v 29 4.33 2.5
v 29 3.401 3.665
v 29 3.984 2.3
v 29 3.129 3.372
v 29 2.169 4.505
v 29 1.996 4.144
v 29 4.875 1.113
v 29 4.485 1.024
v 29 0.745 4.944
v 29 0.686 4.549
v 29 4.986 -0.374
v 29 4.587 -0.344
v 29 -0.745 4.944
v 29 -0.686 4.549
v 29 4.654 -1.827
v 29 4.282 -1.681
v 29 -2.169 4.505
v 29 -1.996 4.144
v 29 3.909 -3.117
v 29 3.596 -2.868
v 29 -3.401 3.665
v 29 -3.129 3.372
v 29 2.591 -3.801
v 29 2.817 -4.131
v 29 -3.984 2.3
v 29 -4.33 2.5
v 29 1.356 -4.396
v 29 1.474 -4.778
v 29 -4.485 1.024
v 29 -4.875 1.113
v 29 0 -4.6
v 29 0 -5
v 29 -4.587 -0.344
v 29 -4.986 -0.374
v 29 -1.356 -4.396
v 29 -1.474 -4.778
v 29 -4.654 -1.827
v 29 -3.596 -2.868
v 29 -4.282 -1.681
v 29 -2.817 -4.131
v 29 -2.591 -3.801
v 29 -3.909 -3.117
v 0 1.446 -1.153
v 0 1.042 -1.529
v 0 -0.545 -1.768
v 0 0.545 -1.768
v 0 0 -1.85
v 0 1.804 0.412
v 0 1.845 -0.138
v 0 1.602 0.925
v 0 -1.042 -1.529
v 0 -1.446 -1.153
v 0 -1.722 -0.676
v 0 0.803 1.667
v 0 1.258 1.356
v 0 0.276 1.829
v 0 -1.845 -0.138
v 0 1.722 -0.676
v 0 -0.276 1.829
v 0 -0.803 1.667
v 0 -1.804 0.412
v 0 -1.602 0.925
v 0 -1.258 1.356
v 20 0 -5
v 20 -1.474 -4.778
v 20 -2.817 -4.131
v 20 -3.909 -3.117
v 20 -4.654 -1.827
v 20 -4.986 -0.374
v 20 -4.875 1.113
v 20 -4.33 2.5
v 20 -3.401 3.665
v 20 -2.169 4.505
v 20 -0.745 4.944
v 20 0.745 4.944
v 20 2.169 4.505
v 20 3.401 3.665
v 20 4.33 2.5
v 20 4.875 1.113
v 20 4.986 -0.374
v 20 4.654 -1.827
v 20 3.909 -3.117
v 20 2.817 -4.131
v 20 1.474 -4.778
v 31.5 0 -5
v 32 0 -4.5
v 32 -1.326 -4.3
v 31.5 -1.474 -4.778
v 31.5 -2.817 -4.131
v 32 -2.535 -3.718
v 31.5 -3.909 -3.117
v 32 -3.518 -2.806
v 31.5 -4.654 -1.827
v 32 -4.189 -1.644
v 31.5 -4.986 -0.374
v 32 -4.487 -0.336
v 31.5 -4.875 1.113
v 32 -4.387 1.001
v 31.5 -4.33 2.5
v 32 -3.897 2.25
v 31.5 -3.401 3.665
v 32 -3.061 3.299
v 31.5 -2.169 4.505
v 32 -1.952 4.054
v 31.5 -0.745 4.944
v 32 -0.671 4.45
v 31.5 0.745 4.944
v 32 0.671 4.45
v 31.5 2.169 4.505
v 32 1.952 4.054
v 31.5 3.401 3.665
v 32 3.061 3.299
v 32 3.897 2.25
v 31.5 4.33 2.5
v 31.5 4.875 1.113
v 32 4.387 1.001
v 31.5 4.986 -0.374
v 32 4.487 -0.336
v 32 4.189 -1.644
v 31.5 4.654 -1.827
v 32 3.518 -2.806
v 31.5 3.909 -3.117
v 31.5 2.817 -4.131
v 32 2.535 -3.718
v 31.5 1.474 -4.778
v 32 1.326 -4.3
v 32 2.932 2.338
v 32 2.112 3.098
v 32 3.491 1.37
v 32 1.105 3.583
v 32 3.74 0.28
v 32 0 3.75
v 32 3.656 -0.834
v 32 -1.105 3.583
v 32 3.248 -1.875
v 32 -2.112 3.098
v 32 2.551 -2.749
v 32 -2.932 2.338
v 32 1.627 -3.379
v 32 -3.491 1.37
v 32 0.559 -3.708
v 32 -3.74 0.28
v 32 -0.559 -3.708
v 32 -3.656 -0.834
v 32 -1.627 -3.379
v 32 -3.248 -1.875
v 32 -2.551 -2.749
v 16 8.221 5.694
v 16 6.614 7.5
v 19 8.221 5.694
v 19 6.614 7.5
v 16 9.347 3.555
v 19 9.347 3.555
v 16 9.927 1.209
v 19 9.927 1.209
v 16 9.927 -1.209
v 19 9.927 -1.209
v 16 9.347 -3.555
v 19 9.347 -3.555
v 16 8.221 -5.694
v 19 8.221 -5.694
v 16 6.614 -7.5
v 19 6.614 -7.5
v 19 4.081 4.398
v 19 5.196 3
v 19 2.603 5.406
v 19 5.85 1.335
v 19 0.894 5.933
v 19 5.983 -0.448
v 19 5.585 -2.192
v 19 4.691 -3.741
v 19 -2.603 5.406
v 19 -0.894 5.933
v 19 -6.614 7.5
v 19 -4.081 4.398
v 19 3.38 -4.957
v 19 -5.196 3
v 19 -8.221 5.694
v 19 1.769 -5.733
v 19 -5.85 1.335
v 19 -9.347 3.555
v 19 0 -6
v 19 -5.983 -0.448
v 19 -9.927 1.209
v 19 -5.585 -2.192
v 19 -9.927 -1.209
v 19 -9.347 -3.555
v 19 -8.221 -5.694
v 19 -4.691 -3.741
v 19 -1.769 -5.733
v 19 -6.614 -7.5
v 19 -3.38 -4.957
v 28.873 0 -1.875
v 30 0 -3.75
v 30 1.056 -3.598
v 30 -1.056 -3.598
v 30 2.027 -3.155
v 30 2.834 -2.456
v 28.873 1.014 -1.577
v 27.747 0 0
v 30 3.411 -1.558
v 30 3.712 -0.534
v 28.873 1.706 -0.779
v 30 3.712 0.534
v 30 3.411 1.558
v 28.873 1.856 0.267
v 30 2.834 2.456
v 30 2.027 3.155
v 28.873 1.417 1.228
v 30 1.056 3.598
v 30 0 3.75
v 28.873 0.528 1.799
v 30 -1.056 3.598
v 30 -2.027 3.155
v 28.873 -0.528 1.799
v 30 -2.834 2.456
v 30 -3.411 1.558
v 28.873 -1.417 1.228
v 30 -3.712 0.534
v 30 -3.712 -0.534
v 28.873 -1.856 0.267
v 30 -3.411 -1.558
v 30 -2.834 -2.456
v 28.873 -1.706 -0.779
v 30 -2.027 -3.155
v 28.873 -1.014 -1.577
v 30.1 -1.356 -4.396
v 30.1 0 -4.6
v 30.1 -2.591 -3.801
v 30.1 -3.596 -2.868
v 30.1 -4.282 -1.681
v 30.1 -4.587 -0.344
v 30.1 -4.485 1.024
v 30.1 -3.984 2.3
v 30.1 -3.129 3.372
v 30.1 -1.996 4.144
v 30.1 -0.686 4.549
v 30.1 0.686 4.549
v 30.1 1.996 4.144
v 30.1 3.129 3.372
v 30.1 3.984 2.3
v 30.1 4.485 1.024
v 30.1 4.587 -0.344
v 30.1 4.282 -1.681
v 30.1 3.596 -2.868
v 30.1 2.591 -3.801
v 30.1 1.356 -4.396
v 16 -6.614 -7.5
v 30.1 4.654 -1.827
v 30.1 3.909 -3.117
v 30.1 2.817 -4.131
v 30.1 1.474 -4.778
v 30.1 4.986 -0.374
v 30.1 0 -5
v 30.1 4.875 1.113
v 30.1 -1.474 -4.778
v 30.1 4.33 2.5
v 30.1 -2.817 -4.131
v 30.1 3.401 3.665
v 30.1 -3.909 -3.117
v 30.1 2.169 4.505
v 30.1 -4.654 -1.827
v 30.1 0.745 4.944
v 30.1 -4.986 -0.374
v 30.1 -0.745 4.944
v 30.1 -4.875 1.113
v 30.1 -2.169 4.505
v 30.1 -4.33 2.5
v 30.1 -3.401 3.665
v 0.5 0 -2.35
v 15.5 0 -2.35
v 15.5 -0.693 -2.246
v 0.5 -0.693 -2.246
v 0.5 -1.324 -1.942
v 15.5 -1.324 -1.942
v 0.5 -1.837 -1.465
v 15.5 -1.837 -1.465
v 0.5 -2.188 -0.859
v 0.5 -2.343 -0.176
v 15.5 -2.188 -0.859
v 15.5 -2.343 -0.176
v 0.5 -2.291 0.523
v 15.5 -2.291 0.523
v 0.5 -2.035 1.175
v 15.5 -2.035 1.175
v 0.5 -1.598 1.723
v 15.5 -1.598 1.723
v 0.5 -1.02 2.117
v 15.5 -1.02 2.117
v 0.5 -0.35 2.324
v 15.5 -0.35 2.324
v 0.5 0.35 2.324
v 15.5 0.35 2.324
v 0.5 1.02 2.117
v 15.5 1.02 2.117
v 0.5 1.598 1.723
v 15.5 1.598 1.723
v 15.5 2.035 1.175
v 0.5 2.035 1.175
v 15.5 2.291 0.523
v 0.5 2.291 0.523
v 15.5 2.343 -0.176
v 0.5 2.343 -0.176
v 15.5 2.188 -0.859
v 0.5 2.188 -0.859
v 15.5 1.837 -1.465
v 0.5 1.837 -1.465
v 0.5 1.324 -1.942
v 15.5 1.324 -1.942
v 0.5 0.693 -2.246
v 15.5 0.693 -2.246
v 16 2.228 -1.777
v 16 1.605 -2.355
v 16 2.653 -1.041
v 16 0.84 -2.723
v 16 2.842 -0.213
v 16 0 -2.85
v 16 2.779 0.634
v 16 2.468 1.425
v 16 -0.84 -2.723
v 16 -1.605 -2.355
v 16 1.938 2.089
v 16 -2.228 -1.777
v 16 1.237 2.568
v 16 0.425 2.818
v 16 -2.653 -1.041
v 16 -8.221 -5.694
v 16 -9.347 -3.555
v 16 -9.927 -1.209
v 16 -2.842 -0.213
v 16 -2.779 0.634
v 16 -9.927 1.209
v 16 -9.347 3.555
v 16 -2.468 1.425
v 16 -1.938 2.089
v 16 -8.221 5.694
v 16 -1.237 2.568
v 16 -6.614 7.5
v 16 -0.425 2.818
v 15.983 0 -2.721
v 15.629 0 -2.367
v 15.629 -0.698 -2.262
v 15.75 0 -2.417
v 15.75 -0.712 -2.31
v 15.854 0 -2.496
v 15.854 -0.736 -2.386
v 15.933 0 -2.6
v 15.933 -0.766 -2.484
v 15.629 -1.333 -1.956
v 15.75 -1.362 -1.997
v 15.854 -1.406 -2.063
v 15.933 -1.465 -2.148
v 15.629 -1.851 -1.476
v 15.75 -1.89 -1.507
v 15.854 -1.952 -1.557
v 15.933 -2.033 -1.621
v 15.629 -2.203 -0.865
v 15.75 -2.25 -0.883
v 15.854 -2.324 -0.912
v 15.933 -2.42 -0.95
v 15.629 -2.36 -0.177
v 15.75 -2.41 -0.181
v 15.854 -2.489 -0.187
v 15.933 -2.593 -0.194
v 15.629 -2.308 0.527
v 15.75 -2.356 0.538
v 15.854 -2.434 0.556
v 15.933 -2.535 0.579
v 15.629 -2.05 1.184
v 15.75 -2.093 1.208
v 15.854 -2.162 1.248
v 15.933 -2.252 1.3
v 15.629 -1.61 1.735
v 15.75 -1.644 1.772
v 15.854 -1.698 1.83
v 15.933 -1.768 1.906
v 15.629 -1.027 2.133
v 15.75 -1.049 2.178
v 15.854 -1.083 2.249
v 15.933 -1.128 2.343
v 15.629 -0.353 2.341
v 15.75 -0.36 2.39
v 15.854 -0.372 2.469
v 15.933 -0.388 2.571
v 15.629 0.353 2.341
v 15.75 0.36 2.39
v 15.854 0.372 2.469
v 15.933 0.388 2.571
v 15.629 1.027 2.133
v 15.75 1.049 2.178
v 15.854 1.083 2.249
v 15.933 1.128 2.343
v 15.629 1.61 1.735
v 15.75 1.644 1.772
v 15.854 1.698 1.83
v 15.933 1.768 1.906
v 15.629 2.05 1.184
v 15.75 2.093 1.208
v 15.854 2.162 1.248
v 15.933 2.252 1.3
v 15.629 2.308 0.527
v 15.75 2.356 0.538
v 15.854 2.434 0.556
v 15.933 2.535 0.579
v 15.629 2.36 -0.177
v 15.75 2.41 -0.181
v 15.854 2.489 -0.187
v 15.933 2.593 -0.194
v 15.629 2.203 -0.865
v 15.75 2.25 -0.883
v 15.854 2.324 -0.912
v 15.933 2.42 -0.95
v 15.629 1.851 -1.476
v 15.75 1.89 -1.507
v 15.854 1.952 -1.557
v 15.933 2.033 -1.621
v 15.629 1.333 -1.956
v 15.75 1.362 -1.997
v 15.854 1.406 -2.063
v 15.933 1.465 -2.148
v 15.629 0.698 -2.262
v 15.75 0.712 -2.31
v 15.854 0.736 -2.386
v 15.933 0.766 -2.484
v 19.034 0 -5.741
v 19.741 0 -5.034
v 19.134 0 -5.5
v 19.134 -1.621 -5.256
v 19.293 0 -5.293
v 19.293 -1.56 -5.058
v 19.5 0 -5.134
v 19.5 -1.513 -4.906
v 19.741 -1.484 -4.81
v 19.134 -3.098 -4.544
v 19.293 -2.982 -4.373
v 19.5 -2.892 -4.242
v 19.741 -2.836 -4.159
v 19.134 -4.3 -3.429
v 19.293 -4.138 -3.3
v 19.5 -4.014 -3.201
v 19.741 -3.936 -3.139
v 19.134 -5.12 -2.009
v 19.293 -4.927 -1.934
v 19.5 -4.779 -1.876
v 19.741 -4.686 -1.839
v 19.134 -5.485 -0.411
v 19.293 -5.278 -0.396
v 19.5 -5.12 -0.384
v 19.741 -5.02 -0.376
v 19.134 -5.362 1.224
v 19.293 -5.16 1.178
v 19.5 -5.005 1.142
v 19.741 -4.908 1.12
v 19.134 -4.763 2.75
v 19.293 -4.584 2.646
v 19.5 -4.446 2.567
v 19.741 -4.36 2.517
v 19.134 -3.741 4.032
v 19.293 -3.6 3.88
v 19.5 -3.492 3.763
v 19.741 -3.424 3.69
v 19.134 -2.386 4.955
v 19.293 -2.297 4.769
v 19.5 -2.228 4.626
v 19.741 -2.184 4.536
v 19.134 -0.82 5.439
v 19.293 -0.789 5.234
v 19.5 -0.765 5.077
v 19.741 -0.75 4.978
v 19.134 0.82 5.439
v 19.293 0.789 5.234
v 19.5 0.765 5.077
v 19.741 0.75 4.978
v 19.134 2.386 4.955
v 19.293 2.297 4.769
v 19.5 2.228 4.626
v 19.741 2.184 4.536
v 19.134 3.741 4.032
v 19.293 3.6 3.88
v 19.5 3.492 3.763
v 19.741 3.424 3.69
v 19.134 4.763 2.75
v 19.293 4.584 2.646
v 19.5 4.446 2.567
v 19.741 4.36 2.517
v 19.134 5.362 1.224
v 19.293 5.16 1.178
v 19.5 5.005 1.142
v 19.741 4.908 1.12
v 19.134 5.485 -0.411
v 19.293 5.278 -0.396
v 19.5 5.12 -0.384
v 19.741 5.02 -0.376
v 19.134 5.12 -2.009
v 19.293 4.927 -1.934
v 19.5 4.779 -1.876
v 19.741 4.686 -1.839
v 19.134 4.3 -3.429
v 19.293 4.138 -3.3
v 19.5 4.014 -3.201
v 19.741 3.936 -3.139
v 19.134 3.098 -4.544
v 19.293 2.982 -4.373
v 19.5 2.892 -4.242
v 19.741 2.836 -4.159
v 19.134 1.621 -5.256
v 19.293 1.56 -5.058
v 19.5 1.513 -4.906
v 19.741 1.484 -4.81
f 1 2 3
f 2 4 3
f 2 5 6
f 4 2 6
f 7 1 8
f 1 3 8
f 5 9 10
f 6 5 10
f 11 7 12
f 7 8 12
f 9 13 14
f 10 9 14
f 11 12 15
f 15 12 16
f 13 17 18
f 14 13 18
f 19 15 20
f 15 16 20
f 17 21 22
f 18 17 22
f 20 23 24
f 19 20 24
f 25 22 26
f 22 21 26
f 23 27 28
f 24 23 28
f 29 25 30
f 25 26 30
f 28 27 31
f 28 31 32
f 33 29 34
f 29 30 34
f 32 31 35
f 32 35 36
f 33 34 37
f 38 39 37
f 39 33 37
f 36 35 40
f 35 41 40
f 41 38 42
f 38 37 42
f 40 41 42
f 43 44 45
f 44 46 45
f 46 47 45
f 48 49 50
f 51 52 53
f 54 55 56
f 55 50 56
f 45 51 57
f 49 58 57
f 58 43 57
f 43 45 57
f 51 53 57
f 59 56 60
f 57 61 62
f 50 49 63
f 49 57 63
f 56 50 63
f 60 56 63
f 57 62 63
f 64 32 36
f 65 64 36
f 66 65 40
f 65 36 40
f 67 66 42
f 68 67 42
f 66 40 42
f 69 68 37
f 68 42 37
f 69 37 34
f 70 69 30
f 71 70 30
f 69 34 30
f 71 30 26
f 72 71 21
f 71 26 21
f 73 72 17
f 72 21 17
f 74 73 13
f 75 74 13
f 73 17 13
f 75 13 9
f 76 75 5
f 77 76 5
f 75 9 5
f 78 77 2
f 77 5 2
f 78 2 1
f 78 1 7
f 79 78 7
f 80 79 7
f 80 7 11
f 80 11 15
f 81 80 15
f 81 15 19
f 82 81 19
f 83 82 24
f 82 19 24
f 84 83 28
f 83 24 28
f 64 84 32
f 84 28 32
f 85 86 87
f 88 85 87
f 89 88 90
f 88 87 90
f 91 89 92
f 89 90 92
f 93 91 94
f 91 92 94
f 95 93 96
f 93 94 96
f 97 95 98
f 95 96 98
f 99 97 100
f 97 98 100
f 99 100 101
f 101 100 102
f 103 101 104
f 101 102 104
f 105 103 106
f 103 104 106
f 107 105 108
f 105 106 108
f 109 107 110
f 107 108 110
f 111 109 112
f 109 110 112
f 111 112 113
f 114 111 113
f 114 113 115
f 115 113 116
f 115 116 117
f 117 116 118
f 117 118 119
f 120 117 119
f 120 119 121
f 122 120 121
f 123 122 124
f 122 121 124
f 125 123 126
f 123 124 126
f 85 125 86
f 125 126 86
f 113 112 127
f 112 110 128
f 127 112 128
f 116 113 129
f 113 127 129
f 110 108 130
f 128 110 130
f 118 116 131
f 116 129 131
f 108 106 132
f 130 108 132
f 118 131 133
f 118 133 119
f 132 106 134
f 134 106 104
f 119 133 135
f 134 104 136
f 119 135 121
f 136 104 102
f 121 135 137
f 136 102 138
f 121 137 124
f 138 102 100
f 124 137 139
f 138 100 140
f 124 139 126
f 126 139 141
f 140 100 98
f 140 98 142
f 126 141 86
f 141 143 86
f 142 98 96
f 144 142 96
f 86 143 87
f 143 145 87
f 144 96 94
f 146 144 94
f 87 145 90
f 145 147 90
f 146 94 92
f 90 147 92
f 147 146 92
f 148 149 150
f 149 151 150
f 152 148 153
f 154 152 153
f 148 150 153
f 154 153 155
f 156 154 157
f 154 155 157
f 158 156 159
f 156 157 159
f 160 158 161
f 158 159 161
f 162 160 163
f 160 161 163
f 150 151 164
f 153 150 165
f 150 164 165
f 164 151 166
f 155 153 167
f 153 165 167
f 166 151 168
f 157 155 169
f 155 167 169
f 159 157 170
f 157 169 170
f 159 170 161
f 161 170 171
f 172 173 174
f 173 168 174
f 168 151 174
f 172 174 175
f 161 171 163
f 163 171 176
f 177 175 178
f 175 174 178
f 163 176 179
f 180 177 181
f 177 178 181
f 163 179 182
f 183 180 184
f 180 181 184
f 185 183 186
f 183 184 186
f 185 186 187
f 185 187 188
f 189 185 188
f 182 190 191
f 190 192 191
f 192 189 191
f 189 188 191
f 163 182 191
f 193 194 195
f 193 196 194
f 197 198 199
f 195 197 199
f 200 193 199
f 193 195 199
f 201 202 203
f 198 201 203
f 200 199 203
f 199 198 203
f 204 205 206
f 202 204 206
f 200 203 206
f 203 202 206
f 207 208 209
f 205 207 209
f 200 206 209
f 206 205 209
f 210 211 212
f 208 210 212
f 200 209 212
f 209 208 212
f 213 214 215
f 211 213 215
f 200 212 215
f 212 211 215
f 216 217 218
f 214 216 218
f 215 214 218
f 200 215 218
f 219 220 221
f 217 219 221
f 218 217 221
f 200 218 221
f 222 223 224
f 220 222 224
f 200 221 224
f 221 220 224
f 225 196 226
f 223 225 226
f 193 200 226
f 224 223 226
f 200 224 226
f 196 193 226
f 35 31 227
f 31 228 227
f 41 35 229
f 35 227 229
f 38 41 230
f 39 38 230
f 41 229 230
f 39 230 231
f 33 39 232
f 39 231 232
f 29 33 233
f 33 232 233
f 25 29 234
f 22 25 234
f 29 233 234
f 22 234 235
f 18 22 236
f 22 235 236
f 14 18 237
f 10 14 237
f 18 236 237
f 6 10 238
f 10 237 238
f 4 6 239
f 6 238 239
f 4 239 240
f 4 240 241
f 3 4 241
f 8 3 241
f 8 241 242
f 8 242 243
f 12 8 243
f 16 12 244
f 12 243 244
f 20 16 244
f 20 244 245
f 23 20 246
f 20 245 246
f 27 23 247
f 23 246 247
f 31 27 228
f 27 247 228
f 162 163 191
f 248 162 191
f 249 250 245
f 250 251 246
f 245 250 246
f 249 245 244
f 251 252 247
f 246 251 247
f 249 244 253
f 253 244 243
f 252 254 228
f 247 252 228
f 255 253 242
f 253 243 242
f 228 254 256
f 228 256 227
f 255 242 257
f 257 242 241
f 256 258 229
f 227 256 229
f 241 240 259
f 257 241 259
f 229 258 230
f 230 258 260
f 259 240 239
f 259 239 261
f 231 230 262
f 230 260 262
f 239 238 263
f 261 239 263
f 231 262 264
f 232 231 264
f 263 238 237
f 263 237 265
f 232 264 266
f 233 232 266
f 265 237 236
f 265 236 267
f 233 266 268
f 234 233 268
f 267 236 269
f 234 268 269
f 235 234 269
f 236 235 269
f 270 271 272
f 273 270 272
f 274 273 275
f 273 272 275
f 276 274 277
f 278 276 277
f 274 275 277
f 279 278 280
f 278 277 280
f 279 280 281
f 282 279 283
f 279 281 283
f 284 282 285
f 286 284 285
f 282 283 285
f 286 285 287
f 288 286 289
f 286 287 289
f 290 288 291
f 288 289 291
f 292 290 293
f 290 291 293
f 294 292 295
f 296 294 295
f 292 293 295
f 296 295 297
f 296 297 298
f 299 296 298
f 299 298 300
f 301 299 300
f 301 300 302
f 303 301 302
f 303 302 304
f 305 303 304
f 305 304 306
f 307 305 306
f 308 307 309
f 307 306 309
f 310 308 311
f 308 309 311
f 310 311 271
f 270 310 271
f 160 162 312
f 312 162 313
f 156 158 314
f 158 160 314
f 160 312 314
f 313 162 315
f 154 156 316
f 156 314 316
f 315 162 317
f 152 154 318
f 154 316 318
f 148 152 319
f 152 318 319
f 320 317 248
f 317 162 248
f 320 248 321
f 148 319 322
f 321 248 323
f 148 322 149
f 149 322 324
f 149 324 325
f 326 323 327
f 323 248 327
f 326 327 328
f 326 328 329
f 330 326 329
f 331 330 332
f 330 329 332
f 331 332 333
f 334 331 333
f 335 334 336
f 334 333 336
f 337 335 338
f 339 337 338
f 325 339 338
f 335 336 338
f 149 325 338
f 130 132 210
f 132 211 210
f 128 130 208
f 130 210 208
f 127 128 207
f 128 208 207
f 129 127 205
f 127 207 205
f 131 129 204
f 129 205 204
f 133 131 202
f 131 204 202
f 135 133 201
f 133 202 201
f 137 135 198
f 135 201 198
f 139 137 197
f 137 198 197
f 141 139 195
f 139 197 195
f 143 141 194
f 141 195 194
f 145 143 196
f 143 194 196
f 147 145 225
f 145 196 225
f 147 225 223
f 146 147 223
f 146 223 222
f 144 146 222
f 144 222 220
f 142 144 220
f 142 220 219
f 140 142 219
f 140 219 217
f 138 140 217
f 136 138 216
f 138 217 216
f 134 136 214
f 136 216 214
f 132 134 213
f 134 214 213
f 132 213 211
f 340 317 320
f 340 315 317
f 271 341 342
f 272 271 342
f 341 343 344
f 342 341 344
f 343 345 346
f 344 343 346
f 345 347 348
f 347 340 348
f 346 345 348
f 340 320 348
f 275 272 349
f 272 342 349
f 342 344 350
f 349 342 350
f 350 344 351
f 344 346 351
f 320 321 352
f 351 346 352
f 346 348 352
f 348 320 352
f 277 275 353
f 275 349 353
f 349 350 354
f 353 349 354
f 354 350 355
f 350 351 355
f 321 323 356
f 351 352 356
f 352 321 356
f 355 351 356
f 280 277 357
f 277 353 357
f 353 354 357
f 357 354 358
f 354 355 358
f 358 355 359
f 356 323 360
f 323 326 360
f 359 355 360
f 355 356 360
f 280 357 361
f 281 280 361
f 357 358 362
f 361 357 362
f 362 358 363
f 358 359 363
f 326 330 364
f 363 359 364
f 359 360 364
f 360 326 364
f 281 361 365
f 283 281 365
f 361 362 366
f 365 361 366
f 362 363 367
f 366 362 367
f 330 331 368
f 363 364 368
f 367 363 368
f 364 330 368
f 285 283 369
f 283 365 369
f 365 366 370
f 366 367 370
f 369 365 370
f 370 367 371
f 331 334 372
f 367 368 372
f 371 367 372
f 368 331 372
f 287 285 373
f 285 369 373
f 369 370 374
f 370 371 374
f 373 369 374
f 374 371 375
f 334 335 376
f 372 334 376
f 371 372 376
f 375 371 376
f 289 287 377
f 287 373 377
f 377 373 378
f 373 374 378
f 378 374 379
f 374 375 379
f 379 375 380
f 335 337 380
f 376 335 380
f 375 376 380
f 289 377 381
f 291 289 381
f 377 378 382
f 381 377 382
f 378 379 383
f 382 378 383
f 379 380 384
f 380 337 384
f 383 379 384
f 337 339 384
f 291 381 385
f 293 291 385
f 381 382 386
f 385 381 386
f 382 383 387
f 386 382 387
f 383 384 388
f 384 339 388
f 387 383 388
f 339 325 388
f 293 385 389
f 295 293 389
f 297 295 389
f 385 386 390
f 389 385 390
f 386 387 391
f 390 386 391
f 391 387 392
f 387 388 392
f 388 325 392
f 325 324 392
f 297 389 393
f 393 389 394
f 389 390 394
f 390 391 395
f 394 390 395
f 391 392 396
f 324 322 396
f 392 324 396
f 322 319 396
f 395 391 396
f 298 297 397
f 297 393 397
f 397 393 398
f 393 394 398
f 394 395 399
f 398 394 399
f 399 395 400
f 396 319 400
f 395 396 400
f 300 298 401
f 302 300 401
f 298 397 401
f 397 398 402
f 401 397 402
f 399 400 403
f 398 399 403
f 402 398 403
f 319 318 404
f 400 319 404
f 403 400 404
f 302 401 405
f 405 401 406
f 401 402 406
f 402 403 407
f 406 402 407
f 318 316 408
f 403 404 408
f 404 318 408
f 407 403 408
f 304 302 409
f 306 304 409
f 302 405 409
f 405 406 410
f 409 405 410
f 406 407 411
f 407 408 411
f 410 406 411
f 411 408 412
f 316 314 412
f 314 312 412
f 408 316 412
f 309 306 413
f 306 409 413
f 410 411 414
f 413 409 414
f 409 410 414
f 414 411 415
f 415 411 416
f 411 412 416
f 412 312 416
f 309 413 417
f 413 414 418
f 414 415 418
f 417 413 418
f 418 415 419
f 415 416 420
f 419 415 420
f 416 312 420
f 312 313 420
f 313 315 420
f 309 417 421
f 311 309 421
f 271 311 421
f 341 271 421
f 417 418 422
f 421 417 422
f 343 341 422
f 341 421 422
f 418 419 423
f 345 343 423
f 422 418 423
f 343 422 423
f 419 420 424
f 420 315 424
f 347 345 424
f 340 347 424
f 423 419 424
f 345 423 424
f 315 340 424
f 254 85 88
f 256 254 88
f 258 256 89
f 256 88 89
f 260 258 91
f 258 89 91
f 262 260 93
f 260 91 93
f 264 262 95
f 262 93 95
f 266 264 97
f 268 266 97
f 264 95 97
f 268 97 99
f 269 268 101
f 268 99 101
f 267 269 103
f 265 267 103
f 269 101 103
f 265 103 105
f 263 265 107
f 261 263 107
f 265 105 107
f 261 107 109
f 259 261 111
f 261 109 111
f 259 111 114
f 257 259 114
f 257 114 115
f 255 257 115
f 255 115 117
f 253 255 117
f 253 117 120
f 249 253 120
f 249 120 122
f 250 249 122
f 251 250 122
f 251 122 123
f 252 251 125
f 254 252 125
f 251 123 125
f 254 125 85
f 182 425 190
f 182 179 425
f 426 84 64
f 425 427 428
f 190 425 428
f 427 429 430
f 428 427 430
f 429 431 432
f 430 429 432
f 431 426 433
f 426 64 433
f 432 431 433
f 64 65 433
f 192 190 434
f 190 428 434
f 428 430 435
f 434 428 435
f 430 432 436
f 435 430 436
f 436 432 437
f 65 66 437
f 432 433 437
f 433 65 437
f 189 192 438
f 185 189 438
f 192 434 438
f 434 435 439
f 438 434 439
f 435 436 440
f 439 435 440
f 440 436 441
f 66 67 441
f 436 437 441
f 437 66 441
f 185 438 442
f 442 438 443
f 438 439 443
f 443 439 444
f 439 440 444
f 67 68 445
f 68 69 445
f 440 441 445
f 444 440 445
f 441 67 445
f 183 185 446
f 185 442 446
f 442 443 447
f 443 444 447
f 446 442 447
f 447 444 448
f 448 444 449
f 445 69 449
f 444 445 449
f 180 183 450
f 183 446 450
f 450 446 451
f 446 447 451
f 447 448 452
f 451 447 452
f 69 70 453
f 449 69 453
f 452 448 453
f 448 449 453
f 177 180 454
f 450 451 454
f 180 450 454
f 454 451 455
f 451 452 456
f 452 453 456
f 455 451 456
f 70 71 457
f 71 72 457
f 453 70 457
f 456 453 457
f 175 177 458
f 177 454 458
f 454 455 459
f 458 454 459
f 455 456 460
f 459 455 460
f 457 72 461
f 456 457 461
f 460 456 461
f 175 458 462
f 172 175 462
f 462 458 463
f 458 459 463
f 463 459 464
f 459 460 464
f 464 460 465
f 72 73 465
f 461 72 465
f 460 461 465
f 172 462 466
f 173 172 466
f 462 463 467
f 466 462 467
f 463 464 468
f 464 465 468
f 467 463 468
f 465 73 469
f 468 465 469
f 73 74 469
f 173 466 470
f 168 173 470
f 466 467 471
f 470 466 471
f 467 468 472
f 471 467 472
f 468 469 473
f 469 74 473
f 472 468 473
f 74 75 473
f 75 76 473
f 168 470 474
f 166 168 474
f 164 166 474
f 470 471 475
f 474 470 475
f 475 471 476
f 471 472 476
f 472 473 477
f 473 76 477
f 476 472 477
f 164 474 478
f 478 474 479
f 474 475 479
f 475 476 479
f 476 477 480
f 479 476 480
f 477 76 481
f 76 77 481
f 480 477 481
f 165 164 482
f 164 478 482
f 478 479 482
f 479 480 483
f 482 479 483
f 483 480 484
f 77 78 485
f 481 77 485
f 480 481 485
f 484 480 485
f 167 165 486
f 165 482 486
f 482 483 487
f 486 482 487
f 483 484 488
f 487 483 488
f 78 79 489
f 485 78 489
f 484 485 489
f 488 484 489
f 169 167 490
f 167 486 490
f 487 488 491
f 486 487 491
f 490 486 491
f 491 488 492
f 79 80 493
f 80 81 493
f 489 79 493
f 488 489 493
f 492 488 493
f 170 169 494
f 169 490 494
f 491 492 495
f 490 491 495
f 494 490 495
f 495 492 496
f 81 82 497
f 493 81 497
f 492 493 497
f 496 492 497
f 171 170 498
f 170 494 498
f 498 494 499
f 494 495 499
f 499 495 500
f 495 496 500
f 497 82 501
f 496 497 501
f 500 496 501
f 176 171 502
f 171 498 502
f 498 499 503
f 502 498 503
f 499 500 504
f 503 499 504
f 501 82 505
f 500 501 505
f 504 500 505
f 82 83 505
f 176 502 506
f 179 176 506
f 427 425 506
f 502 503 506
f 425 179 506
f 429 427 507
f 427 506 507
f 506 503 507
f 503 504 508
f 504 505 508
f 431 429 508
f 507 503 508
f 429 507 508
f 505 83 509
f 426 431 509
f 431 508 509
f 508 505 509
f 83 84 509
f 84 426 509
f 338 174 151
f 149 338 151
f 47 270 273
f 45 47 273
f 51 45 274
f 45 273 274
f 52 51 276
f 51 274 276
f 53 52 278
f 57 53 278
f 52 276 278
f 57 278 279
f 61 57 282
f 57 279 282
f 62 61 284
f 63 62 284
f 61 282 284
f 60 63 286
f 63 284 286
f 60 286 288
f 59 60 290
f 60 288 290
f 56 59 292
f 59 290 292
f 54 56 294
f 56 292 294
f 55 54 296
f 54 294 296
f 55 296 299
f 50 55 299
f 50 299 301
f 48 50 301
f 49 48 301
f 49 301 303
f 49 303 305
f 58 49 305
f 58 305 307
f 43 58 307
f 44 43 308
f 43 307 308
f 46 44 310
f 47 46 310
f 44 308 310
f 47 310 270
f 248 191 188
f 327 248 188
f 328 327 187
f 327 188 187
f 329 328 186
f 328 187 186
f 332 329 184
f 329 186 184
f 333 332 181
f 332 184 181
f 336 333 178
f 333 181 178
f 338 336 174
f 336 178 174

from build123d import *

# Parameters (mm, degrees)
SFAZOWANIE1_SIZE               = 0.5
ZAOKR_GLENIE1_R                = 0.5
OTWORY_USTALAJ_CE_8_0MM1_D     = 7.5
OTWORY_USTALAJ_CE_8_0MM1_DEPTH = 2
OTWORY_USTALAJ_CE_8_0MM1_TIP   = 2.253227321
ZAOKR_GLENIE2_R                = 1
SFAZOWANIE2_SIZE               = 0.5
WYTNIJ_WYCI_GNI_CIE1_DEPTH     = 3


with BuildPart() as part:
    # Szkic1 → Obrót1 (revolve)
    with BuildSketch(Plane.XY, mode=Mode.PRIVATE) as obr_t1_sk:
        Polygon((0, 0), (0, 2.35), (16, 2.35), (16, 10), (19, 10), (19, 5), (29, 5), (29, 4.6), (30.1, 4.6), (30.1, 5), (32, 5), (32, 0), align=None)
    revolve(obr_t1_sk.sketch.rotate(Axis((0, 0, 0), (-1, 0, 0)), 90), axis=Axis((0, 0, 0), (-1, 0, 0)))

    # Sfazowanie1
    sfazowanie1_edges = [part.edges().sort_by_distance(p)[0] for p in [
        (0, 0, 2.35),
    ]]
    chamfer(sfazowanie1_edges, length=SFAZOWANIE1_SIZE)

    # Zaokrąglenie1
    zaokr_glenie1_edges = [part.edges().sort_by_distance(p)[0] for p in [
        (16, 0, 2.35),
    ]]
    fillet(zaokr_glenie1_edges, radius=ZAOKR_GLENIE1_R)

    # Otwory ustalające Ø8.0mm1
    with Locations(Plane(origin=(32, 0, 0), x_dir=(0, 0, -1), z_dir=(1, 0, 0))):
        with Locations((0, 0)):
            Hole(OTWORY_USTALAJ_CE_8_0MM1_D / 2, depth=OTWORY_USTALAJ_CE_8_0MM1_DEPTH)
            with Locations((0, 0, -(OTWORY_USTALAJ_CE_8_0MM1_DEPTH + OTWORY_USTALAJ_CE_8_0MM1_TIP / 2))):  # 118° drill point
                Cone(0, OTWORY_USTALAJ_CE_8_0MM1_D / 2, OTWORY_USTALAJ_CE_8_0MM1_TIP, mode=Mode.SUBTRACT)

    # Zaokrąglenie2
    zaokr_glenie2_edges = [part.edges().sort_by_distance(p)[0] for p in [
        (19, 0, 5),
    ]]
    fillet(zaokr_glenie2_edges, radius=ZAOKR_GLENIE2_R)

    # Sfazowanie2
    sfazowanie2_edges = [part.edges().sort_by_distance(p)[0] for p in [
        (32, 0, 5),
    ]]
    chamfer(sfazowanie2_edges, length=SFAZOWANIE2_SIZE)

    # Szkic5 → Wytnij-wyciągnięcie1 (cut)
    with BuildSketch(Plane(origin=(19, 0, 0), x_dir=(0, 0, -1), z_dir=(1, 0, 0))):
        with BuildLine():
            Line((7.5, 6.614378278), (7.5, -6.614378278))
            ThreePointArc((7.5, -6.614378278), (9.354143467, -3.535533906), (10, 0))
            ThreePointArc((10, 0), (9.354143467, 3.535533906), (7.5, 6.614378278))
        make_face()
        with BuildLine():
            ThreePointArc((-7.5, 6.614378278), (-10, 0), (-7.5, -6.614378278))
            Line((-7.5, -6.614378278), (-7.5, 6.614378278))
        make_face()
    extrude(amount=-WYTNIJ_WYCI_GNI_CIE1_DEPTH, mode=Mode.SUBTRACT)


solid = part.part
